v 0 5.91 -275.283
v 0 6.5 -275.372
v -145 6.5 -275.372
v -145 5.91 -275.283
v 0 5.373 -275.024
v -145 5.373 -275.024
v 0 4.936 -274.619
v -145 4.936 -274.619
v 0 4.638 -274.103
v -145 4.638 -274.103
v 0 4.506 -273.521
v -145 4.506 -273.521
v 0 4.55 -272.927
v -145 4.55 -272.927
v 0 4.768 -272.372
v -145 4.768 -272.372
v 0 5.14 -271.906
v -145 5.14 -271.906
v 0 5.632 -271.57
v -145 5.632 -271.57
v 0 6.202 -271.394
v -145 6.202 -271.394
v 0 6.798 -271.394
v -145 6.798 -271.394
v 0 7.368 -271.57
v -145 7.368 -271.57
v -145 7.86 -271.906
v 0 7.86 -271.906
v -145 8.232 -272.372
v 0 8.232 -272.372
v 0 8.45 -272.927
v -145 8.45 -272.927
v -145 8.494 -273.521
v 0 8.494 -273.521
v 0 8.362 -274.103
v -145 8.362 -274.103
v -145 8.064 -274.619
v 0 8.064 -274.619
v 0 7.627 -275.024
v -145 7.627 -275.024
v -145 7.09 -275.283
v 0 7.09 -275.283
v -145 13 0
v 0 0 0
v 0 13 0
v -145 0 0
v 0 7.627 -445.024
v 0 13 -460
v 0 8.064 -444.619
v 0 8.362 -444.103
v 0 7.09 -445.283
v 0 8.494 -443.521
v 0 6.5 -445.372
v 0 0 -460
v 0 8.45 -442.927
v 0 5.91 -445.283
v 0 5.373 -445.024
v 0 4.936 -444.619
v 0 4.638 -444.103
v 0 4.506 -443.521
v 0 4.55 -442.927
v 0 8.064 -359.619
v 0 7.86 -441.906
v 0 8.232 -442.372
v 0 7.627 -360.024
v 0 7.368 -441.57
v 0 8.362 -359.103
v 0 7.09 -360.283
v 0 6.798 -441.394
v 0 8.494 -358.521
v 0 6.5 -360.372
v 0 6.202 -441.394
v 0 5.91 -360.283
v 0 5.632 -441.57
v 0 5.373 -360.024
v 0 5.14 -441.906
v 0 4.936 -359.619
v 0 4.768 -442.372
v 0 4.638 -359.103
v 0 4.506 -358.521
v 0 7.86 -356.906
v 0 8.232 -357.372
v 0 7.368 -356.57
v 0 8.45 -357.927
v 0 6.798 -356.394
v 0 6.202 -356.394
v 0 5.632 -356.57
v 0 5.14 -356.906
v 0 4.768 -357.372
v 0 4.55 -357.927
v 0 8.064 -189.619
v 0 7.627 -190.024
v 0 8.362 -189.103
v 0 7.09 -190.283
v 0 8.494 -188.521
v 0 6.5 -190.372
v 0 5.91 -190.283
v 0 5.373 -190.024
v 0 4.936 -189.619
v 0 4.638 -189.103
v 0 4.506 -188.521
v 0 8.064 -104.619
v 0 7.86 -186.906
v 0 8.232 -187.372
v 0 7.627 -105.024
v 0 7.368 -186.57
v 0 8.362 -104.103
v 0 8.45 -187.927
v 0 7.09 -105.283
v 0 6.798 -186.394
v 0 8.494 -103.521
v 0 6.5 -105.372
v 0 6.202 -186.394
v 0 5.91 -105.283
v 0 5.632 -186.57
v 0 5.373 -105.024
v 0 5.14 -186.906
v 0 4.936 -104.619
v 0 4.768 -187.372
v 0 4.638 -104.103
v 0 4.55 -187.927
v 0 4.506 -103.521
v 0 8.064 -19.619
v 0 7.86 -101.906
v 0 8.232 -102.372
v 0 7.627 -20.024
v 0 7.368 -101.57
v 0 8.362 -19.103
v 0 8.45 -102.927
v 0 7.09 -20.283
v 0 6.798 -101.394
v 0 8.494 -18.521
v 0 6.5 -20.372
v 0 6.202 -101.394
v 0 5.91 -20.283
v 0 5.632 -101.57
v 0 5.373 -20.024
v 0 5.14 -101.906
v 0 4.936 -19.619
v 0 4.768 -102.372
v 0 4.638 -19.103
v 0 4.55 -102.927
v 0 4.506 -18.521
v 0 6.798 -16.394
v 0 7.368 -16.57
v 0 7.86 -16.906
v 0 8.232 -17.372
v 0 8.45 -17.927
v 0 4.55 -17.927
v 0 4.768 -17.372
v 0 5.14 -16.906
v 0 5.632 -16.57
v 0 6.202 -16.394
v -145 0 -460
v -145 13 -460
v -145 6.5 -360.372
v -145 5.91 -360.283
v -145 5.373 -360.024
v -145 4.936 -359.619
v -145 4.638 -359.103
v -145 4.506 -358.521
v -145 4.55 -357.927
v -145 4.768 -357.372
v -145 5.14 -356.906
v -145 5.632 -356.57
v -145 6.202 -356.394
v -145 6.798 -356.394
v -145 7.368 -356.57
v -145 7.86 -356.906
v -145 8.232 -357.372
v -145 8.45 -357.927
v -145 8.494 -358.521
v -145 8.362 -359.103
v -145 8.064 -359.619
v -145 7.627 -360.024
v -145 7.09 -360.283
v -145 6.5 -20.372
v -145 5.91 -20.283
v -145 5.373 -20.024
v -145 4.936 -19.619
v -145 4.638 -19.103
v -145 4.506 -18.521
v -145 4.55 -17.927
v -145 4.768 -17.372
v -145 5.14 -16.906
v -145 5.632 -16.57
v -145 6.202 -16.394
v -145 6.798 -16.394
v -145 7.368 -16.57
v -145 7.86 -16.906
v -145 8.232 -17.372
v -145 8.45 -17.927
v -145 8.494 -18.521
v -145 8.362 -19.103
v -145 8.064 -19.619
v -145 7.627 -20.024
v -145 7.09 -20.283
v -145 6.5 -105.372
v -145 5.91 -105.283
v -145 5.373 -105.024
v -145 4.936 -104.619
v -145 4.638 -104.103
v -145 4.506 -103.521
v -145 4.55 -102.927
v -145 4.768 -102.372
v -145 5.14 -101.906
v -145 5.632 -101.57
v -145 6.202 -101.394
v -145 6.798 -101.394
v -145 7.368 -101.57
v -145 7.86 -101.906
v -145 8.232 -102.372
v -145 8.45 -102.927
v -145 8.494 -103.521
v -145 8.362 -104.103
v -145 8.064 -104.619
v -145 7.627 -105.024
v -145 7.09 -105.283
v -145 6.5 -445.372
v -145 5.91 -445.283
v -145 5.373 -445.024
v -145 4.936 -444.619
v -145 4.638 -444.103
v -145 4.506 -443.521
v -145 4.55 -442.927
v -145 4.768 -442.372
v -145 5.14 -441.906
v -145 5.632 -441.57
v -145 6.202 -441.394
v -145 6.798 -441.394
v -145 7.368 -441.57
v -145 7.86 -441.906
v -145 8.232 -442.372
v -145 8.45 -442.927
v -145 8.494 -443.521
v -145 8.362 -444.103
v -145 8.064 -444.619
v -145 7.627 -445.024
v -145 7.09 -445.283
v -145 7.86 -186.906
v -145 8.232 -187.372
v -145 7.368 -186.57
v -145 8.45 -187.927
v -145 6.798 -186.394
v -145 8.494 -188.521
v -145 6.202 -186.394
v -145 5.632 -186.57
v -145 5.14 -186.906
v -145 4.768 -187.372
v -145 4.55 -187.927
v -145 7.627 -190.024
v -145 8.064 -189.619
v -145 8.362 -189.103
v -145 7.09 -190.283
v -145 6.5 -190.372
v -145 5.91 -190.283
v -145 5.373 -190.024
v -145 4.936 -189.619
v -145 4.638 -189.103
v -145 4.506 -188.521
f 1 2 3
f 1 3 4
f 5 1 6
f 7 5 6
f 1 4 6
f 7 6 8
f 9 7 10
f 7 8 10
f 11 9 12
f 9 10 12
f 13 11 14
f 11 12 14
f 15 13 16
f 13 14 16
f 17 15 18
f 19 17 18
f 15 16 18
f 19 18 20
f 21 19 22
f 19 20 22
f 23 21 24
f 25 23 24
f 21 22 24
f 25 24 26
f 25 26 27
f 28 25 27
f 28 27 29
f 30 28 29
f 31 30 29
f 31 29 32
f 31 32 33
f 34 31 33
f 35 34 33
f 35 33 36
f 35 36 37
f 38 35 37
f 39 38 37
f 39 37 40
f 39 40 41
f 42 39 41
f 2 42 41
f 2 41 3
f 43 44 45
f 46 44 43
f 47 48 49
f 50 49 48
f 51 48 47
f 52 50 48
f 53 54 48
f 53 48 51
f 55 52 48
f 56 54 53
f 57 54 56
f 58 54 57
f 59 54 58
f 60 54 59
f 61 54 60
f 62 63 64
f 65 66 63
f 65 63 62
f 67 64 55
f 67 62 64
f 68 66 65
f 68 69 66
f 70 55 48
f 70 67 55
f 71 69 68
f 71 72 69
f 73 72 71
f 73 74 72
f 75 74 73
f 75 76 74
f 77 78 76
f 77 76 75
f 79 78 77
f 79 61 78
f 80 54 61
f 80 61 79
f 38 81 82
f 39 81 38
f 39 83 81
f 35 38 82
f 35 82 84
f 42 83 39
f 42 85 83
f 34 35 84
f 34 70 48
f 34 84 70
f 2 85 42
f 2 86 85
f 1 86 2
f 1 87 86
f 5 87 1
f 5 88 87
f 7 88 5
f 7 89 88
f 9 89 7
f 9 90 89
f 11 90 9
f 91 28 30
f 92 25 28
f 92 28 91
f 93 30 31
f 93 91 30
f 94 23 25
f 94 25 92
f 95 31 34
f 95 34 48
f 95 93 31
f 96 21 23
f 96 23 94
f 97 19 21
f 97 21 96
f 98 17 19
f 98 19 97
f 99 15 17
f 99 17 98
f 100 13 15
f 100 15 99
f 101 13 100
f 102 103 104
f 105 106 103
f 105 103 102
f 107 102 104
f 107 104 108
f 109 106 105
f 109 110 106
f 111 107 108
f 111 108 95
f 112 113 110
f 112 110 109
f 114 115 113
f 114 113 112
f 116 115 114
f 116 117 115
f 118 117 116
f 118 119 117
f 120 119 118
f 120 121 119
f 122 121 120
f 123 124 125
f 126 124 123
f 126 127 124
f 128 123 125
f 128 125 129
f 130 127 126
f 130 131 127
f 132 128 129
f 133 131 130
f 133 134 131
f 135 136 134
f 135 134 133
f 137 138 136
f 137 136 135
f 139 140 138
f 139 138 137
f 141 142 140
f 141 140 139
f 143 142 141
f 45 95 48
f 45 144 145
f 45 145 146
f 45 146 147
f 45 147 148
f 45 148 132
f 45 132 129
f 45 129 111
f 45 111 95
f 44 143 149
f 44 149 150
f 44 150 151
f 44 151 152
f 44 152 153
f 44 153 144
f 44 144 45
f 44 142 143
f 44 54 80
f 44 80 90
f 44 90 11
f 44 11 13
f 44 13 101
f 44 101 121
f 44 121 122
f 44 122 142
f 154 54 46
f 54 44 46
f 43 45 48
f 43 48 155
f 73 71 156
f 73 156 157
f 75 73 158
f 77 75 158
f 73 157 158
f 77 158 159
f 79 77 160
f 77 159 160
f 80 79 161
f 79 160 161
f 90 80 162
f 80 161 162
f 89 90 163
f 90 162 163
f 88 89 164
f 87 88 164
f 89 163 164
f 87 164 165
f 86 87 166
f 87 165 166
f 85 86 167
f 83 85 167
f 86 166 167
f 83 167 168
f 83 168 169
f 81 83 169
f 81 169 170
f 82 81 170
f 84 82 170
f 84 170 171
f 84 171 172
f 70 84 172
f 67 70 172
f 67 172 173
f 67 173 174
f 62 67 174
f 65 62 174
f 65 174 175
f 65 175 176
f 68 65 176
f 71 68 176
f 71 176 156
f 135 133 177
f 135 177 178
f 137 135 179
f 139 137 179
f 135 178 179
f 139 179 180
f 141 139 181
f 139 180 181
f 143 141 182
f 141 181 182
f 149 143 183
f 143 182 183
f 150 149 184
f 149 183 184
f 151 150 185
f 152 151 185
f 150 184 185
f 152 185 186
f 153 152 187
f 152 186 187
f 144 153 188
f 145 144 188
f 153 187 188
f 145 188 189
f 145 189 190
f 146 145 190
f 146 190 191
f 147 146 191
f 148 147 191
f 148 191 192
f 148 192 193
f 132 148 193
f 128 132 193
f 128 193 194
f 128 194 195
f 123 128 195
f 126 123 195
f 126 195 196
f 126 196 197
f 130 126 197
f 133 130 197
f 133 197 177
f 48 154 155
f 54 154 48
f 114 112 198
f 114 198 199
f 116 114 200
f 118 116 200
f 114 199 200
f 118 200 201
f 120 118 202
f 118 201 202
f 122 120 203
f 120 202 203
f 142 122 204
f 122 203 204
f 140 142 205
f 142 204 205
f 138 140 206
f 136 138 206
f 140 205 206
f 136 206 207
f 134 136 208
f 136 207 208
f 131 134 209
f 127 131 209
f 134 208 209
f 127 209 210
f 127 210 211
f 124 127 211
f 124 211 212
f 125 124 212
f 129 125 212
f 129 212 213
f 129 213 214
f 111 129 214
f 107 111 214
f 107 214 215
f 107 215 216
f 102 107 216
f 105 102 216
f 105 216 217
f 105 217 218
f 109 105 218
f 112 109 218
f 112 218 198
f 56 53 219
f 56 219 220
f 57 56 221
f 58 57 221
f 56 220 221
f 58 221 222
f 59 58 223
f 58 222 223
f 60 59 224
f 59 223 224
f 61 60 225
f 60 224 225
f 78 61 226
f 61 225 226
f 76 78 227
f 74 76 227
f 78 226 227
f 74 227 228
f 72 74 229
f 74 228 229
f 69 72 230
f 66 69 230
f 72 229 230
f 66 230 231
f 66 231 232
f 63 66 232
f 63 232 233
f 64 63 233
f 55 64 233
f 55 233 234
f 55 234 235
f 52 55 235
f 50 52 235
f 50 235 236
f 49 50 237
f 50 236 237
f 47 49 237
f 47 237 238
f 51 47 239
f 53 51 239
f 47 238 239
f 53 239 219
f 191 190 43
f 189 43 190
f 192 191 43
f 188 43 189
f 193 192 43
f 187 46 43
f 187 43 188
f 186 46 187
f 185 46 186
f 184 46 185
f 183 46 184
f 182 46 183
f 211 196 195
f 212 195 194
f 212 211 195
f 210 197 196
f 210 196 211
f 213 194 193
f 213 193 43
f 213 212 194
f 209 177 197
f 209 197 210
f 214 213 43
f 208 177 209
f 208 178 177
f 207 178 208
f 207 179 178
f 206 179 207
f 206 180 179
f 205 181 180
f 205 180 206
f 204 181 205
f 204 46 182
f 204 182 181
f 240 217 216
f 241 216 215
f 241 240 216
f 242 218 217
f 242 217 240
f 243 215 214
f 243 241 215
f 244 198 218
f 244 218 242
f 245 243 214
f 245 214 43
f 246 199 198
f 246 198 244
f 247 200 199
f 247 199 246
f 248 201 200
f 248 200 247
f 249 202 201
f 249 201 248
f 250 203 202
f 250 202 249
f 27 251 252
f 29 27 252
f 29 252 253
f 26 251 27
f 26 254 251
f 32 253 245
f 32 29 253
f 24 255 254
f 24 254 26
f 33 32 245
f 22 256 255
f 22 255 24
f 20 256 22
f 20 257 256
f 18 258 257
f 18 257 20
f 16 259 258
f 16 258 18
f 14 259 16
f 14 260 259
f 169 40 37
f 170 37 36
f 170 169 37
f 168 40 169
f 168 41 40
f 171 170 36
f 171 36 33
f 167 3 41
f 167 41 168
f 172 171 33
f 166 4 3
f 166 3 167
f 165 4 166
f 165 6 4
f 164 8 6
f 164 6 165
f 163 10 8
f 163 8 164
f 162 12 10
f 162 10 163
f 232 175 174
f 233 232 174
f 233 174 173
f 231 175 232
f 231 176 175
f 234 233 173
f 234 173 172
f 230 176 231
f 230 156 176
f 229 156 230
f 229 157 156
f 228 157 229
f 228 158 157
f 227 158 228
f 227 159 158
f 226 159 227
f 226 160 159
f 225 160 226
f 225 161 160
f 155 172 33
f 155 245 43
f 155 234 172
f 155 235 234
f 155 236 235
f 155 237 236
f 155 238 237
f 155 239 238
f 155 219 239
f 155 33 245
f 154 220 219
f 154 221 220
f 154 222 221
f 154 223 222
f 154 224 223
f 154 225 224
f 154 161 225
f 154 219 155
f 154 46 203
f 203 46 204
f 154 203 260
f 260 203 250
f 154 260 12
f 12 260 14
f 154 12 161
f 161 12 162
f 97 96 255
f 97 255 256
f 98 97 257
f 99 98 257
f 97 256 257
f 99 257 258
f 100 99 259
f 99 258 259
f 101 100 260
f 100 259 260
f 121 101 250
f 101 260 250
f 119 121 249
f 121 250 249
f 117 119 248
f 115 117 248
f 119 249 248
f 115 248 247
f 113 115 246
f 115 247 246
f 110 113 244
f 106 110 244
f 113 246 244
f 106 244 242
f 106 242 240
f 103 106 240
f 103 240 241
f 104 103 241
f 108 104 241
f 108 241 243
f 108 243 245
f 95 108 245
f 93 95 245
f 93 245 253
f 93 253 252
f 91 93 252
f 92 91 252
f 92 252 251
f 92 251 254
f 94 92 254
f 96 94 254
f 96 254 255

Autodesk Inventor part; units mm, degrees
ref_plane "YZ Plane" through (0, 0, 0) normal (1, 0, 0) x (0, 1, 0)
ref_plane "XZ Plane" through (0, 0, 0) normal (0, 1, 0) x (-1, 0, 0)
ref_plane "XY Plane" through (0, 0, 0) normal (0, 0, 1) x (1, 0, 0)
sketch "Sketch1" plane through (0, 0, 0) normal (0, 1, 0) x (-1, 0, 0)
  line L0 (0, 0) -> (145, 0)
  line L1 (145, 0) -> (145, -460)
  line L2 (145, -460) -> (0, -460)
  line L3 (0, -460) -> (0, 0)
  dimension "d0" = 145
  dimension "d1" = 460
extrude "Extrusion1" add sketch "Sketch1" along normal blind 13
sketch "Sketch2" plane through (0, 0, 0) normal (1, 0, 0) x (0, 0, -1)
  line L0 (0, 0) -> (0, 13) projected
  line L1 (0, 13) -> (460, 13) projected
  point P0 (18.372, 6.5)
  dimension "d4" = 18.372
  dimension "d5" = 6.5
hole "Hole1" at (0, 6.5, -18.372) direction (-1, 0, 0) diameter 4 end through all
pattern_linear "Rectangular Pattern1" count 6 spacing 85 along (0, 0, -1) of "Hole1"
properties part number "belt support" material "Wood (Birch)"
